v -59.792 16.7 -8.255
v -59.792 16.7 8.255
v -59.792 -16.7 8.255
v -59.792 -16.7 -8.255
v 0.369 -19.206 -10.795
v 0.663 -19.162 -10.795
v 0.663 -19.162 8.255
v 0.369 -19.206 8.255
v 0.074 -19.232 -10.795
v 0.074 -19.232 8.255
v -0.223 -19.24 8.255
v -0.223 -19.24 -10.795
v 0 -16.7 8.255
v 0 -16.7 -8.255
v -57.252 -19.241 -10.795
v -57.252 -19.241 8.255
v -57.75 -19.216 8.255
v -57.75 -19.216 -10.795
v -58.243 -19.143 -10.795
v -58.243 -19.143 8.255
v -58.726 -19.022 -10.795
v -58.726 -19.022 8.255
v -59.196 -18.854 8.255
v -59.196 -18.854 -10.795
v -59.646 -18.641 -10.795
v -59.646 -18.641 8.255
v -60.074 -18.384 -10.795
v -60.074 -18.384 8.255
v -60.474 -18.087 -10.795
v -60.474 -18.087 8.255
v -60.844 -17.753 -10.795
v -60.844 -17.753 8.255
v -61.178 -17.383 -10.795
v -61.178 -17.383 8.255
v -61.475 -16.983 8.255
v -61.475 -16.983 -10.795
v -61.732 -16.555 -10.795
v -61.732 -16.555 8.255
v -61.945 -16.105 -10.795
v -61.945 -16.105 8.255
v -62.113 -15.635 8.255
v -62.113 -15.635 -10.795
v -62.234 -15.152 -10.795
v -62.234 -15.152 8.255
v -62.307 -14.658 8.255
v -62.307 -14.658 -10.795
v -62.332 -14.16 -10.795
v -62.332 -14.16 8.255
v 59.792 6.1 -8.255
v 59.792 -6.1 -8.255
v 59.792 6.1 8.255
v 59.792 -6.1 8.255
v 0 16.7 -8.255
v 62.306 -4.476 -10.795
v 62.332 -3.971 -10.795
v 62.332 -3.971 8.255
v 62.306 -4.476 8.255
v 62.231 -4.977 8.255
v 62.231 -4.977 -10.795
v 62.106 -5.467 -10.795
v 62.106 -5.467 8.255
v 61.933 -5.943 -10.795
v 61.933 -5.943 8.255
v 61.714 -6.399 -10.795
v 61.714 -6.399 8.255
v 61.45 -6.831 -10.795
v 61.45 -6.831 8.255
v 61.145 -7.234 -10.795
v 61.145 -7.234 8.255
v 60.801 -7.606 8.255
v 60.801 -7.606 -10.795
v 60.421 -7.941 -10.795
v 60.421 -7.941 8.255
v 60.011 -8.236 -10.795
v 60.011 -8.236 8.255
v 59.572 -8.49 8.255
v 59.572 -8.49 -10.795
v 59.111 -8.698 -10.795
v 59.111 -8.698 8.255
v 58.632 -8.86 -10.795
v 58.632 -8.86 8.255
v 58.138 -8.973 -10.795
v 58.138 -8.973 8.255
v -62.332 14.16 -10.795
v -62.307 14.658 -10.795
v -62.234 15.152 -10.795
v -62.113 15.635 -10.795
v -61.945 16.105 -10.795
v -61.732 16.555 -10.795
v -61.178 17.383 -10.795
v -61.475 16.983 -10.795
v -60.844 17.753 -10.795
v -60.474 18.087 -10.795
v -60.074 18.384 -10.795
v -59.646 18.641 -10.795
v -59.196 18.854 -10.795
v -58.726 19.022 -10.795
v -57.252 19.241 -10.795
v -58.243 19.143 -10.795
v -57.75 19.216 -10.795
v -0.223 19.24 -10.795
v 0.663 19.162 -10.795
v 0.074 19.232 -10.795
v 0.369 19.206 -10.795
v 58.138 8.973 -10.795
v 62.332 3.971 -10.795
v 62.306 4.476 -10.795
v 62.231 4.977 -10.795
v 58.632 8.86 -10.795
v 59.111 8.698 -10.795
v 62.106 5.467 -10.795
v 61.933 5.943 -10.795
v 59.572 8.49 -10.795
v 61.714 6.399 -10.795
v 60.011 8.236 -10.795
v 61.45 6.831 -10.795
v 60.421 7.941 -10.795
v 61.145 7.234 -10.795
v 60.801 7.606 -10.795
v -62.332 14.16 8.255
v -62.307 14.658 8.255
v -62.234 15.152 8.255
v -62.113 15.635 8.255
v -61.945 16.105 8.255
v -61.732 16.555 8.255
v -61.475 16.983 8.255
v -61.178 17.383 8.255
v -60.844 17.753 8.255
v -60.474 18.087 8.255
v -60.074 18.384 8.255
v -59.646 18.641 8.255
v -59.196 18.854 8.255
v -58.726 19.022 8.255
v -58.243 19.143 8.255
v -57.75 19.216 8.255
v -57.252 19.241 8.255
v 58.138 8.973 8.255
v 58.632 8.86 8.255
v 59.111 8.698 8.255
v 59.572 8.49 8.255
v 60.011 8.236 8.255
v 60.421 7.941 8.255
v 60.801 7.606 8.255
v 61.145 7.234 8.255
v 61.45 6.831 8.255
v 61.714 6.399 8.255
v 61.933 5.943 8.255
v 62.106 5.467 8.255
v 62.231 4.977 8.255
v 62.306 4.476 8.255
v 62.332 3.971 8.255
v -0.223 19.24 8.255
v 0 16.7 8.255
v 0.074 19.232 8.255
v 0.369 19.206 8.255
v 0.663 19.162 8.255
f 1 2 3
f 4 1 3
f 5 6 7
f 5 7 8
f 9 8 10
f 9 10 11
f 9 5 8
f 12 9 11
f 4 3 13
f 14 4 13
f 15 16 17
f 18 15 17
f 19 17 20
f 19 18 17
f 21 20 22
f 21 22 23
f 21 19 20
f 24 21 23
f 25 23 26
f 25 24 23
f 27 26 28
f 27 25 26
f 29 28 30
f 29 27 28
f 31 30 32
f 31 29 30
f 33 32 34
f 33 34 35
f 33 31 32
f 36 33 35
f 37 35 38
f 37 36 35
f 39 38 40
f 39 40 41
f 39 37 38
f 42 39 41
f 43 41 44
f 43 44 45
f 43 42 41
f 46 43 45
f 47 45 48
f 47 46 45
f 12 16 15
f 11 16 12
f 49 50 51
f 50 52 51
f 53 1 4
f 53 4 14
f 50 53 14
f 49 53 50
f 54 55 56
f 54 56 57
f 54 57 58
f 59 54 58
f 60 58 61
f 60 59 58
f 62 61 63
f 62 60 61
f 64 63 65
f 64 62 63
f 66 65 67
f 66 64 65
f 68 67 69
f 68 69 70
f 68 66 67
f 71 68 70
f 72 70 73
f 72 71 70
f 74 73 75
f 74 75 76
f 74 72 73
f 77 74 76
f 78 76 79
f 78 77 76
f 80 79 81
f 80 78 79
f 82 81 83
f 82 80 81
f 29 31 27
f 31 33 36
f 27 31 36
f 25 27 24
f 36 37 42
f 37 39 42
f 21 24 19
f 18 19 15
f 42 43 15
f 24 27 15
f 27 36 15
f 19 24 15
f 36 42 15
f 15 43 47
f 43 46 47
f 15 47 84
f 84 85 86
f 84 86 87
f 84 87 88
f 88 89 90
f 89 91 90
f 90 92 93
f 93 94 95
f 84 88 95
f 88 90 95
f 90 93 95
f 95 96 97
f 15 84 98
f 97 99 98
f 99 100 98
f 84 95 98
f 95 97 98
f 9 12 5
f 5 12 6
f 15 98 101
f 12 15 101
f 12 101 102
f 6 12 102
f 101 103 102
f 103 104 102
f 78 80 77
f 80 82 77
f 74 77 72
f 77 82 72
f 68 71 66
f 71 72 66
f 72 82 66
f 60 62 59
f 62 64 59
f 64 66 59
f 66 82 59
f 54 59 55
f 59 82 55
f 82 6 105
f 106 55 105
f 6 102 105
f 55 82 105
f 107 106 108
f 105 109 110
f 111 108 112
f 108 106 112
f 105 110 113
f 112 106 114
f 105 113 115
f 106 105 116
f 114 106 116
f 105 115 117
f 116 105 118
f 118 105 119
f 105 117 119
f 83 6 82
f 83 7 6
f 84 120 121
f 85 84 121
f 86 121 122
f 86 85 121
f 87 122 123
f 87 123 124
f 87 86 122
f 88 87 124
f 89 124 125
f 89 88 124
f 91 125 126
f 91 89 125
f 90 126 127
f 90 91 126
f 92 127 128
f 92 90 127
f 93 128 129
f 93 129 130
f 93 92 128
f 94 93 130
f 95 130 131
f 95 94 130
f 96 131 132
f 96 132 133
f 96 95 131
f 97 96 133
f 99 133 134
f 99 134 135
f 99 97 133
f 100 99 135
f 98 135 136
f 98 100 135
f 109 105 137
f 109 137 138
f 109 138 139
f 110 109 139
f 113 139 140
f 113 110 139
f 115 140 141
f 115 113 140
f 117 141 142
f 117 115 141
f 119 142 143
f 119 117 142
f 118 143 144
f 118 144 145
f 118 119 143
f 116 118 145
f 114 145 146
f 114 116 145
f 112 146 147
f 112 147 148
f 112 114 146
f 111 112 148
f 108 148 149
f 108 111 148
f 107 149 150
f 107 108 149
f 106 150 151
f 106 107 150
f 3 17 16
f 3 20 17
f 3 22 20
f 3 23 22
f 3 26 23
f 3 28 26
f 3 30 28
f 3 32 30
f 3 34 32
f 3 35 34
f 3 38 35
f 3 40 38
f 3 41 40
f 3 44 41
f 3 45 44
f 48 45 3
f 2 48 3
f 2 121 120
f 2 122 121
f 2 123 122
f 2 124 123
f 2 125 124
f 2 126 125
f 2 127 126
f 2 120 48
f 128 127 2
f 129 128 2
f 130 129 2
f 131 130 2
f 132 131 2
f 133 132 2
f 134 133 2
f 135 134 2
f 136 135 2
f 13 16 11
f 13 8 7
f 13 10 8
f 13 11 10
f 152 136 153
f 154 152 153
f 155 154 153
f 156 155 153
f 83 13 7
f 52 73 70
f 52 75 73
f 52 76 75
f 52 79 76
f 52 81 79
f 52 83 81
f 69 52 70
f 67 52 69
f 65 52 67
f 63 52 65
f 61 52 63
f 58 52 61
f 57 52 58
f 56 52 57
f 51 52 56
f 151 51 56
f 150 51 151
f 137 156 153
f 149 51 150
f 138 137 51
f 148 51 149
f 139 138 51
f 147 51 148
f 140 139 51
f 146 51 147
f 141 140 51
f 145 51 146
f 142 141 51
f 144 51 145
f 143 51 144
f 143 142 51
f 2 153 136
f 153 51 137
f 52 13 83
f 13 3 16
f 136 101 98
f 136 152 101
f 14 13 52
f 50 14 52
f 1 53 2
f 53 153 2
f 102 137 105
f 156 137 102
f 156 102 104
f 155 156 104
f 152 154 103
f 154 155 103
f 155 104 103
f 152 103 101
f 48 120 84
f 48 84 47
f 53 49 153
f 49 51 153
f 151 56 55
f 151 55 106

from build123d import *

# Parameters (mm, degrees)
F1_DEPTH    = 8.255
F2_T        = 2.54
F3_T1_DEPTH = 40.3429500211
F3_T3_DEPTH = 21.284150325
F3_T5_DEPTH = 44.45


# Not quite as in the source:
# - a fillet or chamfer that OpenCascade refuses, or shapes differently, is made with other operations: its cross-section is extruded or revolved along the edge and cut away or added


with BuildPart() as f1:
    # F0 (on Top) → F1 (new body, symmetric)
    with BuildSketch(Plane.XY):
        Polygon((0, 16.7005), (-59.7916, 16.7005), (-59.7916, -16.7005), (0, -16.7005), (59.7916, -6.1001079157), (59.7916, 6.1001079157), align=None)
    extrude(amount=F1_DEPTH, both=True)

    # F2
    f2_openings = [f1.faces().sort_by_distance(p)[0] for p in [
        (-7.518342, 0, 8.255),
    ]]
    offset(amount=F2_T, openings=f2_openings, kind=Kind.INTERSECTION)

    # F3: fillet of radius 5.08 on 6 edges, made by hand

    # F3_s2 → F3_t1 (cut)
    with BuildSketch(Plane.XY.offset(-21.4414750105)):
        with BuildLine():
            ThreePointArc((58.1383992054, 8.9728112312), (61.1446283818, 7.2343585343), (62.3316, 3.9708129136))
            Line((62.3316, 3.9708129136), (62.3316, 8.2294029178))
            Line((62.3316, 8.2294029178), (58.1383992054, 8.9728112312))
        make_face()
        with BuildLine():
            ThreePointArc((62.3316, -3.9708129136), (61.1446283818, -7.2343585343), (58.1383992054, -8.9728112312))
            Line((58.1383992054, -8.9728112312), (62.3316, -8.2294029178))
            Line((62.3316, -8.2294029178), (62.3316, -3.9708129136))
        make_face()
    extrude(amount=F3_T1_DEPTH, mode=Mode.SUBTRACT)

    # F3_s4 → F3_t3 (cut)
    with BuildSketch(Plane.XY.offset(-11.9120751625)):
        with BuildLine():
            ThreePointArc((0.6633841729, 19.1624983176), (0.2216964966, 19.2209620072), (-0.2234150325, 19.2405))
            Line((-0.2234150325, 19.2405), (0.2234150325, 19.2405))
            Line((0.2234150325, 19.2405), (0.6633841729, 19.1624983176))
        make_face()
        with BuildLine():
            ThreePointArc((0.6633841729, -19.1624983176), (0.2216964966, -19.2209620072), (-0.2234150325, -19.2405))
            Line((-0.2234150325, -19.2405), (0.2234150325, -19.2405))
            Line((0.2234150325, -19.2405), (0.6633841729, -19.1624983176))
        make_face()
    extrude(amount=F3_T3_DEPTH, mode=Mode.SUBTRACT)

    # F3_s6 → F3_t5 (cut)
    with BuildSketch(Plane.XY.offset(-23.495)):
        with BuildLine():
            ThreePointArc((-57.2516, -19.2405), (-60.8437024484, -17.7526024484), (-62.3316, -14.1605))
            Line((-62.3316, -14.1605), (-62.3316, -19.2405))
            Line((-62.3316, -19.2405), (-57.2516, -19.2405))
        make_face()
        with BuildLine():
            ThreePointArc((-62.3316, 14.1605), (-60.8437024484, 17.7526024484), (-57.2516, 19.2405))
            Line((-57.2516, 19.2405), (-62.3316, 19.2405))
            Line((-62.3316, 19.2405), (-62.3316, 14.1605))
        make_face()
    extrude(amount=F3_T5_DEPTH, mode=Mode.SUBTRACT)


solid = f1.part
